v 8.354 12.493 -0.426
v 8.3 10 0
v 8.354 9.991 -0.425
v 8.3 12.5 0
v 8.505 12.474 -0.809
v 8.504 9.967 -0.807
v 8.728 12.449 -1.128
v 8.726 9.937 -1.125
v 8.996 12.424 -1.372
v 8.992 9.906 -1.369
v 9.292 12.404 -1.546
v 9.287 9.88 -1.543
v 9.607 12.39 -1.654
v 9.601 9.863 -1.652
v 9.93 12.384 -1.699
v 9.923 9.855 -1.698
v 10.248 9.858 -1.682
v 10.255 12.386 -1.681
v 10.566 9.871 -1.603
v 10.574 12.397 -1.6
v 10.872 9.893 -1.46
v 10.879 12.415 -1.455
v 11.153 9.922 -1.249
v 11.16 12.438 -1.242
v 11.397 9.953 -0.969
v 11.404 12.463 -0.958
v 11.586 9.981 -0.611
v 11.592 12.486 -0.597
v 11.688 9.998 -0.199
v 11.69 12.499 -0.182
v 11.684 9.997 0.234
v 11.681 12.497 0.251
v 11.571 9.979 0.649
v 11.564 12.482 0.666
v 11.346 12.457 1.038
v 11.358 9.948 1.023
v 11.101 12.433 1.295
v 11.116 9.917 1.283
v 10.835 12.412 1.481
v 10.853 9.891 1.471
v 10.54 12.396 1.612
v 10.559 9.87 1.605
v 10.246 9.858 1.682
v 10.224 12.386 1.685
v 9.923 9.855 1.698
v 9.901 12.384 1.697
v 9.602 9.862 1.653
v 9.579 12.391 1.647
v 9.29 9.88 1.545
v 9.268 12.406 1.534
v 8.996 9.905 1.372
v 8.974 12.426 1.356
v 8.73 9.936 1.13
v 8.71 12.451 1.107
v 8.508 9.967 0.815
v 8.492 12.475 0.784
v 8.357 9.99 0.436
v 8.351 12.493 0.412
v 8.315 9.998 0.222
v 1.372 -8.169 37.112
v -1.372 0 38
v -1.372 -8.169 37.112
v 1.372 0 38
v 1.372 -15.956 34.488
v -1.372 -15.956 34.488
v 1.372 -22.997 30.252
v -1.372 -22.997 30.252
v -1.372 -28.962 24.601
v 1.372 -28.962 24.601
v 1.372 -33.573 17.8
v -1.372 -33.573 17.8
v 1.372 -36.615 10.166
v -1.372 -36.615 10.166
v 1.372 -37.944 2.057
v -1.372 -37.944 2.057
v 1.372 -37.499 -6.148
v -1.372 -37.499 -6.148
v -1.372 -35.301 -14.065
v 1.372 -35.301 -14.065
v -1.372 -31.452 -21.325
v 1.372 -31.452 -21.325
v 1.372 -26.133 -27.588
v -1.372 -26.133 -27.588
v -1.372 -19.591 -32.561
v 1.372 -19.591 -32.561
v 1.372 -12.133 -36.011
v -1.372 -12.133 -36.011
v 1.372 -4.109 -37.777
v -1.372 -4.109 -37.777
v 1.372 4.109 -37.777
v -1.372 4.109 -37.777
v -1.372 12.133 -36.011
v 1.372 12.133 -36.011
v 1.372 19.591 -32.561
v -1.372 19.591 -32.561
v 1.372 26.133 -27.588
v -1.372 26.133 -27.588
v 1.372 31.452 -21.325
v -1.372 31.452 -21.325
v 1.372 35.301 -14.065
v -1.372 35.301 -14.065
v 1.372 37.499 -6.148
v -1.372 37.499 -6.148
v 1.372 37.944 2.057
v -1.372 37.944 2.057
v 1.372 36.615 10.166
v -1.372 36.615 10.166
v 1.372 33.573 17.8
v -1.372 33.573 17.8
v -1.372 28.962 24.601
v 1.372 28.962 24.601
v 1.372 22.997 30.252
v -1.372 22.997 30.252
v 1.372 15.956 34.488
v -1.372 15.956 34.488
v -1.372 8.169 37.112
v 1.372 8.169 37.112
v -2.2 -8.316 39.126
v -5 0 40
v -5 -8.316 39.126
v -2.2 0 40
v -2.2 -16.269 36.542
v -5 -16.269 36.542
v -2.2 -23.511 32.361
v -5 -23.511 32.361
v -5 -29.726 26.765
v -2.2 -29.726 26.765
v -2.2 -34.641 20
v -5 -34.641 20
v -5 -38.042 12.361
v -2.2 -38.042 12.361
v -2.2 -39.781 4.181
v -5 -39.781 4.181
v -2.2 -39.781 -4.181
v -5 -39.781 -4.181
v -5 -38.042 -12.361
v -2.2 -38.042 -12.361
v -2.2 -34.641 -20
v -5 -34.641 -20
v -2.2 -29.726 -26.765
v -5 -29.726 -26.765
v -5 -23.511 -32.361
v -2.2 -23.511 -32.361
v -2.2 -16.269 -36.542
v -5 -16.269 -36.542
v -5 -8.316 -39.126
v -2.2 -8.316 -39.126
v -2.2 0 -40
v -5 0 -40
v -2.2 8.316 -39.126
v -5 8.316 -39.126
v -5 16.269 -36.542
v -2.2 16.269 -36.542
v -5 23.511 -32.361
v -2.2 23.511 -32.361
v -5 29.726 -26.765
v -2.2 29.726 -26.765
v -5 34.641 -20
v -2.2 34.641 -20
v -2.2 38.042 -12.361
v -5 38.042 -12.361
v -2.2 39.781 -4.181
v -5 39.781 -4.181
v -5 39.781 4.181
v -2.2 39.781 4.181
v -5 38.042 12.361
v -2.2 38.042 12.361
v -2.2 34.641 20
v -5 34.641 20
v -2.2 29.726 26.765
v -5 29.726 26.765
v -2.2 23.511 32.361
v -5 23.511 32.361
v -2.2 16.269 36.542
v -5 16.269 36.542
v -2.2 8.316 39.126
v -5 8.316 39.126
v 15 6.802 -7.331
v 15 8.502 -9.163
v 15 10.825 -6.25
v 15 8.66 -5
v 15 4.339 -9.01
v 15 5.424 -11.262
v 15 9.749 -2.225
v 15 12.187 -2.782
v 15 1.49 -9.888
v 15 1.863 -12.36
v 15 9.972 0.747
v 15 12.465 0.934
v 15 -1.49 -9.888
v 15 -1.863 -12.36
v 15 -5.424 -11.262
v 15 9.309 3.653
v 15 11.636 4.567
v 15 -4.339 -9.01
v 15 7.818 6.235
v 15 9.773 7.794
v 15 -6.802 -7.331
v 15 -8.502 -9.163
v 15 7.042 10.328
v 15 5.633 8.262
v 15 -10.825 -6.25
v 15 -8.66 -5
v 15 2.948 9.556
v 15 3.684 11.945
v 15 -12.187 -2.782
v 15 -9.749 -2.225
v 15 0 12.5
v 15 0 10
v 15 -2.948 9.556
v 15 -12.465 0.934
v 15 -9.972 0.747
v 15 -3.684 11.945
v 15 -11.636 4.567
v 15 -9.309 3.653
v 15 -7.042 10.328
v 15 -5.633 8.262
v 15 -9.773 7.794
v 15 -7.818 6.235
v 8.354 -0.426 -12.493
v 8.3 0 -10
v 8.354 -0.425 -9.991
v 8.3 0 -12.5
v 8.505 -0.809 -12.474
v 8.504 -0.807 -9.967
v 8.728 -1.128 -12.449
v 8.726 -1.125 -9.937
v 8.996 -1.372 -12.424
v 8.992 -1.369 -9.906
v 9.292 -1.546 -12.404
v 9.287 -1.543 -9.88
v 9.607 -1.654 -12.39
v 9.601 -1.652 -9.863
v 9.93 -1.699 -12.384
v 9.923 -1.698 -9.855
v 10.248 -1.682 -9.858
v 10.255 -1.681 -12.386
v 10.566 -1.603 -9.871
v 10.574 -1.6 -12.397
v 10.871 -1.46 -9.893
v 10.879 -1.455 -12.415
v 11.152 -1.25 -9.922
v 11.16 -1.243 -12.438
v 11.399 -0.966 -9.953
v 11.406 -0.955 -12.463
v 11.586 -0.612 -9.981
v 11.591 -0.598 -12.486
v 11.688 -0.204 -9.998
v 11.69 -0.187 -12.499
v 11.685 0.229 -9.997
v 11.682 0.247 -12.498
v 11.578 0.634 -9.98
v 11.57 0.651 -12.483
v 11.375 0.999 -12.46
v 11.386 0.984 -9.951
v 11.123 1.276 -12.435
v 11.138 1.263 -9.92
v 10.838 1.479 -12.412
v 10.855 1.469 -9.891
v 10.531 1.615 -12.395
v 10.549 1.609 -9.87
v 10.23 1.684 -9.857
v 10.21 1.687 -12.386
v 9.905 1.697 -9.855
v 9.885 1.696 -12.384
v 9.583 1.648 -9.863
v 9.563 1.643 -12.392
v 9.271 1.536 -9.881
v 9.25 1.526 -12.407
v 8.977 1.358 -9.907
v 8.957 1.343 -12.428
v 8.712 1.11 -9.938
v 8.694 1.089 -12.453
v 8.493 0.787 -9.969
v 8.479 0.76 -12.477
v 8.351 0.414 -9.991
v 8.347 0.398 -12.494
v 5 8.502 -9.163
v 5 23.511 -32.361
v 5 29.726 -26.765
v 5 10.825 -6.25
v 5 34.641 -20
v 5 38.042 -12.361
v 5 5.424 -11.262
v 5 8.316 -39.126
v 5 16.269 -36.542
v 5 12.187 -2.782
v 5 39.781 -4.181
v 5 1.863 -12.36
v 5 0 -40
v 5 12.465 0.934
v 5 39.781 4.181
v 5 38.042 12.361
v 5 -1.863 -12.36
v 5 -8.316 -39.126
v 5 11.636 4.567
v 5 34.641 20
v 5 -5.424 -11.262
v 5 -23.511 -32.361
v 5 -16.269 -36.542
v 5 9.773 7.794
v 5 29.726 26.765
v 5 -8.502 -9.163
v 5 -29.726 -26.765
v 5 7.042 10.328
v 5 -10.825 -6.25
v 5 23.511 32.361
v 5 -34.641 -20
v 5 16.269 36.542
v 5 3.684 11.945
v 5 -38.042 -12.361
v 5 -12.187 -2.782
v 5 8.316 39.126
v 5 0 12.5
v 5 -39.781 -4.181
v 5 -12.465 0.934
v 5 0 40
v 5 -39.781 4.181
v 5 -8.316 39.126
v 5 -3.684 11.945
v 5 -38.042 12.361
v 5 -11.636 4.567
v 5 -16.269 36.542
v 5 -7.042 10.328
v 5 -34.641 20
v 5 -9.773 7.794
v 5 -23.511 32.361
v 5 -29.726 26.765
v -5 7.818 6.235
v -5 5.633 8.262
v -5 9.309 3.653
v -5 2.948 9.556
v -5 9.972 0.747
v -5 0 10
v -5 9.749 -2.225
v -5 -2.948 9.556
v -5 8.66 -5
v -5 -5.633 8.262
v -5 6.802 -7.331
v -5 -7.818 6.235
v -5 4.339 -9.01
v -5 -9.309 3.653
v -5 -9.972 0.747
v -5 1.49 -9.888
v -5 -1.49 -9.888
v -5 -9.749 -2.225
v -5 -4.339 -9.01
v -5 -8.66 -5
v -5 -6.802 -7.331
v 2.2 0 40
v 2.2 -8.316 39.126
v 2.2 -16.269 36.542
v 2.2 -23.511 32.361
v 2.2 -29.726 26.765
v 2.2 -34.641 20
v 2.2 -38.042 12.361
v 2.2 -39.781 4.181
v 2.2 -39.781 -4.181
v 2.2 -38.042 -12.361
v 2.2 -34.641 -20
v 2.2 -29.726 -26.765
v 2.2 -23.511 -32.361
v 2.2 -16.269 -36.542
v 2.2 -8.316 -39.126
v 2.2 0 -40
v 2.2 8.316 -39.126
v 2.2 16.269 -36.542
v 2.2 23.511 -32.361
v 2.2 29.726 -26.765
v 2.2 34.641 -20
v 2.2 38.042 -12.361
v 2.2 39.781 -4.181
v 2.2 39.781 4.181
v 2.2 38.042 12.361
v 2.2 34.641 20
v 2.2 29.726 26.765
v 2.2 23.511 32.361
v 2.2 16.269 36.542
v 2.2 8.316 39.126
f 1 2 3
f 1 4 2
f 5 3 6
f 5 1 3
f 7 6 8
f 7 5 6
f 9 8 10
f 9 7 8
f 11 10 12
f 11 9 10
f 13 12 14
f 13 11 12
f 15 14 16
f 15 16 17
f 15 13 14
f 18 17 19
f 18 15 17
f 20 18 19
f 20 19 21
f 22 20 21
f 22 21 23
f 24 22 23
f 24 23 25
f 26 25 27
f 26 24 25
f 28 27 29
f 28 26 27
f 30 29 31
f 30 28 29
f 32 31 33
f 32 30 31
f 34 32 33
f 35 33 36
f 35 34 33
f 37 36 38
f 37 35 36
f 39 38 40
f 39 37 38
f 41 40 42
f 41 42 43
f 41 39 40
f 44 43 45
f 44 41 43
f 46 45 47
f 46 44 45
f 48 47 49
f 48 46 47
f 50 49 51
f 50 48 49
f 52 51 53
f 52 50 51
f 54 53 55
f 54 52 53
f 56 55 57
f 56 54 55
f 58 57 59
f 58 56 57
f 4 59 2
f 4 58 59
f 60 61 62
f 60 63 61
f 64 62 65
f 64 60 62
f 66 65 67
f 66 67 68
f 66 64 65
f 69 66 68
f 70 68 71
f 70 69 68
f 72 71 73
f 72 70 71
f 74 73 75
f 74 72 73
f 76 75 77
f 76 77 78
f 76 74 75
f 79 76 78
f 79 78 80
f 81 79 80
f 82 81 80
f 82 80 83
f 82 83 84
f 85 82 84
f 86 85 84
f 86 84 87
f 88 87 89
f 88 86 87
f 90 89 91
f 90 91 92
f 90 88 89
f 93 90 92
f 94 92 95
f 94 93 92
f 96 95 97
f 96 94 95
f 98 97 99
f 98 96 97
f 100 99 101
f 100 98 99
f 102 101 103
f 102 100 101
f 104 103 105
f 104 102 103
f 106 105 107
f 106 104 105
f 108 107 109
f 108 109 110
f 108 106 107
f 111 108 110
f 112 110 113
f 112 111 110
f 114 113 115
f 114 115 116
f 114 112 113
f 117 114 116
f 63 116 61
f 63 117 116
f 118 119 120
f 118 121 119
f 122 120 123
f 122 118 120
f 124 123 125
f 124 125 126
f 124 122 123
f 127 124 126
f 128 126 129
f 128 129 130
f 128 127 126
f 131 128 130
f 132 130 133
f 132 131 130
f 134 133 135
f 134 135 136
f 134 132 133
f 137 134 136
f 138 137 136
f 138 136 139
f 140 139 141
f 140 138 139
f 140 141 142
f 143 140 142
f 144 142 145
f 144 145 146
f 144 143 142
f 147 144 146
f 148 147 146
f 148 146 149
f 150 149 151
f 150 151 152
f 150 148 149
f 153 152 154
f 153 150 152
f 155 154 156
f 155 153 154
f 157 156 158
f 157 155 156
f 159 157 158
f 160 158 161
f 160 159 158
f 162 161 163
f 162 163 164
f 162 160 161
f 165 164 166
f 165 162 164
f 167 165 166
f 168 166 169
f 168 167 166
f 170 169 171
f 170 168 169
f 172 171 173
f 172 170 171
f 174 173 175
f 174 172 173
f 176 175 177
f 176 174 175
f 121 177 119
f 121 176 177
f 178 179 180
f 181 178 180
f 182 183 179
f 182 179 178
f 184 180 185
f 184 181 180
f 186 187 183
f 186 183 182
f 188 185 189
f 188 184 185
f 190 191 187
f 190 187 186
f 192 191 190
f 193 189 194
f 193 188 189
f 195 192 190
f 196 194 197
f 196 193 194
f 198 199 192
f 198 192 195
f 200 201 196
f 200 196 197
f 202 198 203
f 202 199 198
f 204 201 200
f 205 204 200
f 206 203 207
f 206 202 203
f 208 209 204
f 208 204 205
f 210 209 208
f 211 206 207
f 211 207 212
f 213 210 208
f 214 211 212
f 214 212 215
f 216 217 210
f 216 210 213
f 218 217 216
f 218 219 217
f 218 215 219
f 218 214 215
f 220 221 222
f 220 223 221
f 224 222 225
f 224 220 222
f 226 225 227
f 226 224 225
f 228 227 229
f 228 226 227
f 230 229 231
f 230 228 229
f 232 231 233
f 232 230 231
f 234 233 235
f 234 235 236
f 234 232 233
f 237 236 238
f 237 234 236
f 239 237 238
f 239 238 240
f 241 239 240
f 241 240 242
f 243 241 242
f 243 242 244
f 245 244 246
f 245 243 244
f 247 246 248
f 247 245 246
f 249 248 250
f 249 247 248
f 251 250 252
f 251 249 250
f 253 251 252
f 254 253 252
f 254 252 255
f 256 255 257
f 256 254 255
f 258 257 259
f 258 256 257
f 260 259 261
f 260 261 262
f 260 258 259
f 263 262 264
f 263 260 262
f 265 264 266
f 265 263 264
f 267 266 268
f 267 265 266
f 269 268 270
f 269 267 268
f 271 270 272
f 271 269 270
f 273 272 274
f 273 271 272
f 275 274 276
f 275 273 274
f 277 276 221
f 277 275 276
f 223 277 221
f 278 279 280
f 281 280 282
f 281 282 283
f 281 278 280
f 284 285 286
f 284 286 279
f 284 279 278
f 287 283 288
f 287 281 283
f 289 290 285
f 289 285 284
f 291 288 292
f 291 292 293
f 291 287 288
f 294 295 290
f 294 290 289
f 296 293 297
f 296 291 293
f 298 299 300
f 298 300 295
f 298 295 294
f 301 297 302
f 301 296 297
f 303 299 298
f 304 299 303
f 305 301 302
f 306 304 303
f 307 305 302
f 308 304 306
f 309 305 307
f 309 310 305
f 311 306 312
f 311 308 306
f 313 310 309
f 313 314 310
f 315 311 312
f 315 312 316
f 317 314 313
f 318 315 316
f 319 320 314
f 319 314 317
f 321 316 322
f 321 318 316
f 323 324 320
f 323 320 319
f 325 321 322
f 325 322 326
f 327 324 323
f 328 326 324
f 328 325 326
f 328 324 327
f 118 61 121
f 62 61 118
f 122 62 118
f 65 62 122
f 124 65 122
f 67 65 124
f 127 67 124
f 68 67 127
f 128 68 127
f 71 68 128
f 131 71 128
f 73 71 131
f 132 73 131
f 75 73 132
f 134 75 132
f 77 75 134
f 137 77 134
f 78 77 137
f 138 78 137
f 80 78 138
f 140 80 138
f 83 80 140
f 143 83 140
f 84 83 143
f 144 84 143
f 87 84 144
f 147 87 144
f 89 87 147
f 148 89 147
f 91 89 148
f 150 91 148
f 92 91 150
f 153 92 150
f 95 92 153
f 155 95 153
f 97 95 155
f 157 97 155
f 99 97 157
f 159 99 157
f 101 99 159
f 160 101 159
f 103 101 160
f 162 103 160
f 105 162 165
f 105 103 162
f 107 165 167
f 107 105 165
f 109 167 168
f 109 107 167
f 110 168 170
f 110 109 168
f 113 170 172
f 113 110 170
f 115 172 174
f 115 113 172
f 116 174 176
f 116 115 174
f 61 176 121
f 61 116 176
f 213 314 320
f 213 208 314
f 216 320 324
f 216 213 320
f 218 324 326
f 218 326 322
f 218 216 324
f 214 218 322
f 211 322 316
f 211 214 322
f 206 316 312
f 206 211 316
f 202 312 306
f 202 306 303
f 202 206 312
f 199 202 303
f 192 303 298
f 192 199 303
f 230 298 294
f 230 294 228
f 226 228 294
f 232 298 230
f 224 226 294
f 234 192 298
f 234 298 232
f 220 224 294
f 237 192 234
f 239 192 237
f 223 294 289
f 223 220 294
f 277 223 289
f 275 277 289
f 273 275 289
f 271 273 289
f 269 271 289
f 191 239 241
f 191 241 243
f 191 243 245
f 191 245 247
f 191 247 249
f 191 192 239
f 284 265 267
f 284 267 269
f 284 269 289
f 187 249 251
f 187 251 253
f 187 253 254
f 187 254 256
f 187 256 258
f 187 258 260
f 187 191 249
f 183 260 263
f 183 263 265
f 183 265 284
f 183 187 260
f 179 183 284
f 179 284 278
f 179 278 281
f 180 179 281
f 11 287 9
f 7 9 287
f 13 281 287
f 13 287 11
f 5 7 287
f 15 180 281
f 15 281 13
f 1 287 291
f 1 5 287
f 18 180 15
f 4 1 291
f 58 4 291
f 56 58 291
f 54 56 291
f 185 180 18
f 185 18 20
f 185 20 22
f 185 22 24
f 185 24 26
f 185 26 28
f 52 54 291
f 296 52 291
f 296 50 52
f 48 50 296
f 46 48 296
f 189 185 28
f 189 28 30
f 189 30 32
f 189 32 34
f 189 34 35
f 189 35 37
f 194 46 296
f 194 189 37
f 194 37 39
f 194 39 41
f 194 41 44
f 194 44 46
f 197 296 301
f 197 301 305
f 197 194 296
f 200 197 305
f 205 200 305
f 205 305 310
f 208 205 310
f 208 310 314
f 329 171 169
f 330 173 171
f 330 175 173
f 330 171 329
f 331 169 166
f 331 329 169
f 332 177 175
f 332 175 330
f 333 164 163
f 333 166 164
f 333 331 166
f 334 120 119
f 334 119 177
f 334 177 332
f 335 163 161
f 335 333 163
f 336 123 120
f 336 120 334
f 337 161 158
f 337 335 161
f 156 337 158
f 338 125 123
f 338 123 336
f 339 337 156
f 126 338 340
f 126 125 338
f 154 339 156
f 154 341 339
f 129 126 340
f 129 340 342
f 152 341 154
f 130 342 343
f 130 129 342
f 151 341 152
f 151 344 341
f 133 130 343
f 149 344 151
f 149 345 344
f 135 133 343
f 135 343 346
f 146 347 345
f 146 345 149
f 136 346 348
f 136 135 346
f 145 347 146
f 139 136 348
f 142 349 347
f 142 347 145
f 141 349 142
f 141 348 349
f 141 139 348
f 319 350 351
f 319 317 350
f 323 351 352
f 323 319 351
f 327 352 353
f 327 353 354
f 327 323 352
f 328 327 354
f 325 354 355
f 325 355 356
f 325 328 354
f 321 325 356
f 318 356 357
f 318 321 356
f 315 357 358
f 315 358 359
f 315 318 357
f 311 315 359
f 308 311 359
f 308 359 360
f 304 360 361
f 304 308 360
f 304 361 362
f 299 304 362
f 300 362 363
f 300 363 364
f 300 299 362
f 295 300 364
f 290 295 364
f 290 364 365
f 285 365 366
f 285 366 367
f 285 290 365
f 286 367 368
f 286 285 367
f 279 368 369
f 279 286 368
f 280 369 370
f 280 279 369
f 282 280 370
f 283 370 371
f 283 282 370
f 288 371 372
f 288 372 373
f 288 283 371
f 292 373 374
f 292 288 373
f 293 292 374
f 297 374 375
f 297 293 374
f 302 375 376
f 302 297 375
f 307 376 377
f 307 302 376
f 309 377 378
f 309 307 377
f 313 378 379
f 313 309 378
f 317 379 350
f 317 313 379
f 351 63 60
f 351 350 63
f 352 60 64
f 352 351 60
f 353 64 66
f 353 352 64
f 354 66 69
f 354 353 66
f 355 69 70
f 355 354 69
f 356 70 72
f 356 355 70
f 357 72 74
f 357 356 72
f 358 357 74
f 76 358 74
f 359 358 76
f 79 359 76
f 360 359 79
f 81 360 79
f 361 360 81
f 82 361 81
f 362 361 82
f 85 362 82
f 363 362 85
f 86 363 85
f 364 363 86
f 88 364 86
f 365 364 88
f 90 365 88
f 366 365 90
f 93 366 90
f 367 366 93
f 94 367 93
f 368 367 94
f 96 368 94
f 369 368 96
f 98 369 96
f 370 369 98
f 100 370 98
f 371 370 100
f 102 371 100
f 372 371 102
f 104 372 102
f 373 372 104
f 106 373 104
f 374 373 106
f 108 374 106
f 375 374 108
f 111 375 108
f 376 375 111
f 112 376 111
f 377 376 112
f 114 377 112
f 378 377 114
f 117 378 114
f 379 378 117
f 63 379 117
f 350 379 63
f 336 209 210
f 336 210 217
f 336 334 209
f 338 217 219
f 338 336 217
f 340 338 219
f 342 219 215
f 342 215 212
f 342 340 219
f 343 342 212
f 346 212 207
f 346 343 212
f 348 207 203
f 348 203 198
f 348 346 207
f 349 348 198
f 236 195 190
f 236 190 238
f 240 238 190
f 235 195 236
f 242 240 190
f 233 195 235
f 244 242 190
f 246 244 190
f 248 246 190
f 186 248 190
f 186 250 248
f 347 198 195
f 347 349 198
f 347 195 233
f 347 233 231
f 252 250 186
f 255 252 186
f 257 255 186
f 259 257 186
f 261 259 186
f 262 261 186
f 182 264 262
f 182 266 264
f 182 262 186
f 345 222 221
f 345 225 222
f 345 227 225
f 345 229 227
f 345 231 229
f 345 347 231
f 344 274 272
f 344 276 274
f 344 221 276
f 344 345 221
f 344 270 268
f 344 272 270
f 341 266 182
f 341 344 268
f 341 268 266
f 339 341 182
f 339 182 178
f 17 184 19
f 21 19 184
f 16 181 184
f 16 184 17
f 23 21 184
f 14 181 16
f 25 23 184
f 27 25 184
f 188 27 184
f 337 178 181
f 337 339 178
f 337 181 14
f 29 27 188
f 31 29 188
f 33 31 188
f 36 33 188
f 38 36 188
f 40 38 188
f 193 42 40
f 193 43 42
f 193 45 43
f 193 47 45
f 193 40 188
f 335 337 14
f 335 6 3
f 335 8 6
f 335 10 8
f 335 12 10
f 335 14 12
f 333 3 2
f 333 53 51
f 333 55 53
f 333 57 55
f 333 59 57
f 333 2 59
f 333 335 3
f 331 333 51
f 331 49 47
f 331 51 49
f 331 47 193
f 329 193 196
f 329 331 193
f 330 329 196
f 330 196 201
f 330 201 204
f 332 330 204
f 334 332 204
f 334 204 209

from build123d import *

# Parameters (mm, degrees)
SKETCH_7_W               = 1.7
SKETCH_7_H               = 40
PATTERN_CIRCULAR_2_COUNT = 2
PATTERN_CIRCULAR_2_ANGLE = 90


with BuildPart() as part:
    # 草图6 → 旋转2 (revolve)
    with BuildSketch(Plane.XY, mode=Mode.PRIVATE) as revolve_2_sk:
        Polygon((15, 12.5), (15, 10), (-5, 10), (-5, 40), (-2.2, 40), (-1.371572875, 38), (1.371572875, 38), (2.2, 40), (5, 40), (5, 12.5), align=None)
    revolve(revolve_2_sk.sketch.rotate(Axis((-5, 0, 0), (1, 0, 0)), 90), axis=Axis((-5, 0, 0), (1, 0, 0)))

    # 草图7 → 切除-旋转3 (revolve, cut)
    with BuildSketch(Plane.XY, mode=Mode.PRIVATE) as cut_revolve_3_sk:
        with Locations((10.85, 20)):
            Rectangle(SKETCH_7_W, SKETCH_7_H)
    cut_revolve_3 = revolve(cut_revolve_3_sk.sketch.rotate(Axis((10, 40, 0), (0, -1, 0)), 180), axis=Axis((10, 40, 0), (0, -1, 0)), mode=Mode.SUBTRACT)

    # 阵列(圆周)2: 切除-旋转3 ×2 about axis
    pattern_circular_2_axis = Axis((-5, 0, 0), (-1, 0, 0))
    for i in range(1, PATTERN_CIRCULAR_2_COUNT):
        add(cut_revolve_3.rotate(pattern_circular_2_axis, i * PATTERN_CIRCULAR_2_ANGLE / (PATTERN_CIRCULAR_2_COUNT - 1)), mode=Mode.SUBTRACT)


solid = part.part
